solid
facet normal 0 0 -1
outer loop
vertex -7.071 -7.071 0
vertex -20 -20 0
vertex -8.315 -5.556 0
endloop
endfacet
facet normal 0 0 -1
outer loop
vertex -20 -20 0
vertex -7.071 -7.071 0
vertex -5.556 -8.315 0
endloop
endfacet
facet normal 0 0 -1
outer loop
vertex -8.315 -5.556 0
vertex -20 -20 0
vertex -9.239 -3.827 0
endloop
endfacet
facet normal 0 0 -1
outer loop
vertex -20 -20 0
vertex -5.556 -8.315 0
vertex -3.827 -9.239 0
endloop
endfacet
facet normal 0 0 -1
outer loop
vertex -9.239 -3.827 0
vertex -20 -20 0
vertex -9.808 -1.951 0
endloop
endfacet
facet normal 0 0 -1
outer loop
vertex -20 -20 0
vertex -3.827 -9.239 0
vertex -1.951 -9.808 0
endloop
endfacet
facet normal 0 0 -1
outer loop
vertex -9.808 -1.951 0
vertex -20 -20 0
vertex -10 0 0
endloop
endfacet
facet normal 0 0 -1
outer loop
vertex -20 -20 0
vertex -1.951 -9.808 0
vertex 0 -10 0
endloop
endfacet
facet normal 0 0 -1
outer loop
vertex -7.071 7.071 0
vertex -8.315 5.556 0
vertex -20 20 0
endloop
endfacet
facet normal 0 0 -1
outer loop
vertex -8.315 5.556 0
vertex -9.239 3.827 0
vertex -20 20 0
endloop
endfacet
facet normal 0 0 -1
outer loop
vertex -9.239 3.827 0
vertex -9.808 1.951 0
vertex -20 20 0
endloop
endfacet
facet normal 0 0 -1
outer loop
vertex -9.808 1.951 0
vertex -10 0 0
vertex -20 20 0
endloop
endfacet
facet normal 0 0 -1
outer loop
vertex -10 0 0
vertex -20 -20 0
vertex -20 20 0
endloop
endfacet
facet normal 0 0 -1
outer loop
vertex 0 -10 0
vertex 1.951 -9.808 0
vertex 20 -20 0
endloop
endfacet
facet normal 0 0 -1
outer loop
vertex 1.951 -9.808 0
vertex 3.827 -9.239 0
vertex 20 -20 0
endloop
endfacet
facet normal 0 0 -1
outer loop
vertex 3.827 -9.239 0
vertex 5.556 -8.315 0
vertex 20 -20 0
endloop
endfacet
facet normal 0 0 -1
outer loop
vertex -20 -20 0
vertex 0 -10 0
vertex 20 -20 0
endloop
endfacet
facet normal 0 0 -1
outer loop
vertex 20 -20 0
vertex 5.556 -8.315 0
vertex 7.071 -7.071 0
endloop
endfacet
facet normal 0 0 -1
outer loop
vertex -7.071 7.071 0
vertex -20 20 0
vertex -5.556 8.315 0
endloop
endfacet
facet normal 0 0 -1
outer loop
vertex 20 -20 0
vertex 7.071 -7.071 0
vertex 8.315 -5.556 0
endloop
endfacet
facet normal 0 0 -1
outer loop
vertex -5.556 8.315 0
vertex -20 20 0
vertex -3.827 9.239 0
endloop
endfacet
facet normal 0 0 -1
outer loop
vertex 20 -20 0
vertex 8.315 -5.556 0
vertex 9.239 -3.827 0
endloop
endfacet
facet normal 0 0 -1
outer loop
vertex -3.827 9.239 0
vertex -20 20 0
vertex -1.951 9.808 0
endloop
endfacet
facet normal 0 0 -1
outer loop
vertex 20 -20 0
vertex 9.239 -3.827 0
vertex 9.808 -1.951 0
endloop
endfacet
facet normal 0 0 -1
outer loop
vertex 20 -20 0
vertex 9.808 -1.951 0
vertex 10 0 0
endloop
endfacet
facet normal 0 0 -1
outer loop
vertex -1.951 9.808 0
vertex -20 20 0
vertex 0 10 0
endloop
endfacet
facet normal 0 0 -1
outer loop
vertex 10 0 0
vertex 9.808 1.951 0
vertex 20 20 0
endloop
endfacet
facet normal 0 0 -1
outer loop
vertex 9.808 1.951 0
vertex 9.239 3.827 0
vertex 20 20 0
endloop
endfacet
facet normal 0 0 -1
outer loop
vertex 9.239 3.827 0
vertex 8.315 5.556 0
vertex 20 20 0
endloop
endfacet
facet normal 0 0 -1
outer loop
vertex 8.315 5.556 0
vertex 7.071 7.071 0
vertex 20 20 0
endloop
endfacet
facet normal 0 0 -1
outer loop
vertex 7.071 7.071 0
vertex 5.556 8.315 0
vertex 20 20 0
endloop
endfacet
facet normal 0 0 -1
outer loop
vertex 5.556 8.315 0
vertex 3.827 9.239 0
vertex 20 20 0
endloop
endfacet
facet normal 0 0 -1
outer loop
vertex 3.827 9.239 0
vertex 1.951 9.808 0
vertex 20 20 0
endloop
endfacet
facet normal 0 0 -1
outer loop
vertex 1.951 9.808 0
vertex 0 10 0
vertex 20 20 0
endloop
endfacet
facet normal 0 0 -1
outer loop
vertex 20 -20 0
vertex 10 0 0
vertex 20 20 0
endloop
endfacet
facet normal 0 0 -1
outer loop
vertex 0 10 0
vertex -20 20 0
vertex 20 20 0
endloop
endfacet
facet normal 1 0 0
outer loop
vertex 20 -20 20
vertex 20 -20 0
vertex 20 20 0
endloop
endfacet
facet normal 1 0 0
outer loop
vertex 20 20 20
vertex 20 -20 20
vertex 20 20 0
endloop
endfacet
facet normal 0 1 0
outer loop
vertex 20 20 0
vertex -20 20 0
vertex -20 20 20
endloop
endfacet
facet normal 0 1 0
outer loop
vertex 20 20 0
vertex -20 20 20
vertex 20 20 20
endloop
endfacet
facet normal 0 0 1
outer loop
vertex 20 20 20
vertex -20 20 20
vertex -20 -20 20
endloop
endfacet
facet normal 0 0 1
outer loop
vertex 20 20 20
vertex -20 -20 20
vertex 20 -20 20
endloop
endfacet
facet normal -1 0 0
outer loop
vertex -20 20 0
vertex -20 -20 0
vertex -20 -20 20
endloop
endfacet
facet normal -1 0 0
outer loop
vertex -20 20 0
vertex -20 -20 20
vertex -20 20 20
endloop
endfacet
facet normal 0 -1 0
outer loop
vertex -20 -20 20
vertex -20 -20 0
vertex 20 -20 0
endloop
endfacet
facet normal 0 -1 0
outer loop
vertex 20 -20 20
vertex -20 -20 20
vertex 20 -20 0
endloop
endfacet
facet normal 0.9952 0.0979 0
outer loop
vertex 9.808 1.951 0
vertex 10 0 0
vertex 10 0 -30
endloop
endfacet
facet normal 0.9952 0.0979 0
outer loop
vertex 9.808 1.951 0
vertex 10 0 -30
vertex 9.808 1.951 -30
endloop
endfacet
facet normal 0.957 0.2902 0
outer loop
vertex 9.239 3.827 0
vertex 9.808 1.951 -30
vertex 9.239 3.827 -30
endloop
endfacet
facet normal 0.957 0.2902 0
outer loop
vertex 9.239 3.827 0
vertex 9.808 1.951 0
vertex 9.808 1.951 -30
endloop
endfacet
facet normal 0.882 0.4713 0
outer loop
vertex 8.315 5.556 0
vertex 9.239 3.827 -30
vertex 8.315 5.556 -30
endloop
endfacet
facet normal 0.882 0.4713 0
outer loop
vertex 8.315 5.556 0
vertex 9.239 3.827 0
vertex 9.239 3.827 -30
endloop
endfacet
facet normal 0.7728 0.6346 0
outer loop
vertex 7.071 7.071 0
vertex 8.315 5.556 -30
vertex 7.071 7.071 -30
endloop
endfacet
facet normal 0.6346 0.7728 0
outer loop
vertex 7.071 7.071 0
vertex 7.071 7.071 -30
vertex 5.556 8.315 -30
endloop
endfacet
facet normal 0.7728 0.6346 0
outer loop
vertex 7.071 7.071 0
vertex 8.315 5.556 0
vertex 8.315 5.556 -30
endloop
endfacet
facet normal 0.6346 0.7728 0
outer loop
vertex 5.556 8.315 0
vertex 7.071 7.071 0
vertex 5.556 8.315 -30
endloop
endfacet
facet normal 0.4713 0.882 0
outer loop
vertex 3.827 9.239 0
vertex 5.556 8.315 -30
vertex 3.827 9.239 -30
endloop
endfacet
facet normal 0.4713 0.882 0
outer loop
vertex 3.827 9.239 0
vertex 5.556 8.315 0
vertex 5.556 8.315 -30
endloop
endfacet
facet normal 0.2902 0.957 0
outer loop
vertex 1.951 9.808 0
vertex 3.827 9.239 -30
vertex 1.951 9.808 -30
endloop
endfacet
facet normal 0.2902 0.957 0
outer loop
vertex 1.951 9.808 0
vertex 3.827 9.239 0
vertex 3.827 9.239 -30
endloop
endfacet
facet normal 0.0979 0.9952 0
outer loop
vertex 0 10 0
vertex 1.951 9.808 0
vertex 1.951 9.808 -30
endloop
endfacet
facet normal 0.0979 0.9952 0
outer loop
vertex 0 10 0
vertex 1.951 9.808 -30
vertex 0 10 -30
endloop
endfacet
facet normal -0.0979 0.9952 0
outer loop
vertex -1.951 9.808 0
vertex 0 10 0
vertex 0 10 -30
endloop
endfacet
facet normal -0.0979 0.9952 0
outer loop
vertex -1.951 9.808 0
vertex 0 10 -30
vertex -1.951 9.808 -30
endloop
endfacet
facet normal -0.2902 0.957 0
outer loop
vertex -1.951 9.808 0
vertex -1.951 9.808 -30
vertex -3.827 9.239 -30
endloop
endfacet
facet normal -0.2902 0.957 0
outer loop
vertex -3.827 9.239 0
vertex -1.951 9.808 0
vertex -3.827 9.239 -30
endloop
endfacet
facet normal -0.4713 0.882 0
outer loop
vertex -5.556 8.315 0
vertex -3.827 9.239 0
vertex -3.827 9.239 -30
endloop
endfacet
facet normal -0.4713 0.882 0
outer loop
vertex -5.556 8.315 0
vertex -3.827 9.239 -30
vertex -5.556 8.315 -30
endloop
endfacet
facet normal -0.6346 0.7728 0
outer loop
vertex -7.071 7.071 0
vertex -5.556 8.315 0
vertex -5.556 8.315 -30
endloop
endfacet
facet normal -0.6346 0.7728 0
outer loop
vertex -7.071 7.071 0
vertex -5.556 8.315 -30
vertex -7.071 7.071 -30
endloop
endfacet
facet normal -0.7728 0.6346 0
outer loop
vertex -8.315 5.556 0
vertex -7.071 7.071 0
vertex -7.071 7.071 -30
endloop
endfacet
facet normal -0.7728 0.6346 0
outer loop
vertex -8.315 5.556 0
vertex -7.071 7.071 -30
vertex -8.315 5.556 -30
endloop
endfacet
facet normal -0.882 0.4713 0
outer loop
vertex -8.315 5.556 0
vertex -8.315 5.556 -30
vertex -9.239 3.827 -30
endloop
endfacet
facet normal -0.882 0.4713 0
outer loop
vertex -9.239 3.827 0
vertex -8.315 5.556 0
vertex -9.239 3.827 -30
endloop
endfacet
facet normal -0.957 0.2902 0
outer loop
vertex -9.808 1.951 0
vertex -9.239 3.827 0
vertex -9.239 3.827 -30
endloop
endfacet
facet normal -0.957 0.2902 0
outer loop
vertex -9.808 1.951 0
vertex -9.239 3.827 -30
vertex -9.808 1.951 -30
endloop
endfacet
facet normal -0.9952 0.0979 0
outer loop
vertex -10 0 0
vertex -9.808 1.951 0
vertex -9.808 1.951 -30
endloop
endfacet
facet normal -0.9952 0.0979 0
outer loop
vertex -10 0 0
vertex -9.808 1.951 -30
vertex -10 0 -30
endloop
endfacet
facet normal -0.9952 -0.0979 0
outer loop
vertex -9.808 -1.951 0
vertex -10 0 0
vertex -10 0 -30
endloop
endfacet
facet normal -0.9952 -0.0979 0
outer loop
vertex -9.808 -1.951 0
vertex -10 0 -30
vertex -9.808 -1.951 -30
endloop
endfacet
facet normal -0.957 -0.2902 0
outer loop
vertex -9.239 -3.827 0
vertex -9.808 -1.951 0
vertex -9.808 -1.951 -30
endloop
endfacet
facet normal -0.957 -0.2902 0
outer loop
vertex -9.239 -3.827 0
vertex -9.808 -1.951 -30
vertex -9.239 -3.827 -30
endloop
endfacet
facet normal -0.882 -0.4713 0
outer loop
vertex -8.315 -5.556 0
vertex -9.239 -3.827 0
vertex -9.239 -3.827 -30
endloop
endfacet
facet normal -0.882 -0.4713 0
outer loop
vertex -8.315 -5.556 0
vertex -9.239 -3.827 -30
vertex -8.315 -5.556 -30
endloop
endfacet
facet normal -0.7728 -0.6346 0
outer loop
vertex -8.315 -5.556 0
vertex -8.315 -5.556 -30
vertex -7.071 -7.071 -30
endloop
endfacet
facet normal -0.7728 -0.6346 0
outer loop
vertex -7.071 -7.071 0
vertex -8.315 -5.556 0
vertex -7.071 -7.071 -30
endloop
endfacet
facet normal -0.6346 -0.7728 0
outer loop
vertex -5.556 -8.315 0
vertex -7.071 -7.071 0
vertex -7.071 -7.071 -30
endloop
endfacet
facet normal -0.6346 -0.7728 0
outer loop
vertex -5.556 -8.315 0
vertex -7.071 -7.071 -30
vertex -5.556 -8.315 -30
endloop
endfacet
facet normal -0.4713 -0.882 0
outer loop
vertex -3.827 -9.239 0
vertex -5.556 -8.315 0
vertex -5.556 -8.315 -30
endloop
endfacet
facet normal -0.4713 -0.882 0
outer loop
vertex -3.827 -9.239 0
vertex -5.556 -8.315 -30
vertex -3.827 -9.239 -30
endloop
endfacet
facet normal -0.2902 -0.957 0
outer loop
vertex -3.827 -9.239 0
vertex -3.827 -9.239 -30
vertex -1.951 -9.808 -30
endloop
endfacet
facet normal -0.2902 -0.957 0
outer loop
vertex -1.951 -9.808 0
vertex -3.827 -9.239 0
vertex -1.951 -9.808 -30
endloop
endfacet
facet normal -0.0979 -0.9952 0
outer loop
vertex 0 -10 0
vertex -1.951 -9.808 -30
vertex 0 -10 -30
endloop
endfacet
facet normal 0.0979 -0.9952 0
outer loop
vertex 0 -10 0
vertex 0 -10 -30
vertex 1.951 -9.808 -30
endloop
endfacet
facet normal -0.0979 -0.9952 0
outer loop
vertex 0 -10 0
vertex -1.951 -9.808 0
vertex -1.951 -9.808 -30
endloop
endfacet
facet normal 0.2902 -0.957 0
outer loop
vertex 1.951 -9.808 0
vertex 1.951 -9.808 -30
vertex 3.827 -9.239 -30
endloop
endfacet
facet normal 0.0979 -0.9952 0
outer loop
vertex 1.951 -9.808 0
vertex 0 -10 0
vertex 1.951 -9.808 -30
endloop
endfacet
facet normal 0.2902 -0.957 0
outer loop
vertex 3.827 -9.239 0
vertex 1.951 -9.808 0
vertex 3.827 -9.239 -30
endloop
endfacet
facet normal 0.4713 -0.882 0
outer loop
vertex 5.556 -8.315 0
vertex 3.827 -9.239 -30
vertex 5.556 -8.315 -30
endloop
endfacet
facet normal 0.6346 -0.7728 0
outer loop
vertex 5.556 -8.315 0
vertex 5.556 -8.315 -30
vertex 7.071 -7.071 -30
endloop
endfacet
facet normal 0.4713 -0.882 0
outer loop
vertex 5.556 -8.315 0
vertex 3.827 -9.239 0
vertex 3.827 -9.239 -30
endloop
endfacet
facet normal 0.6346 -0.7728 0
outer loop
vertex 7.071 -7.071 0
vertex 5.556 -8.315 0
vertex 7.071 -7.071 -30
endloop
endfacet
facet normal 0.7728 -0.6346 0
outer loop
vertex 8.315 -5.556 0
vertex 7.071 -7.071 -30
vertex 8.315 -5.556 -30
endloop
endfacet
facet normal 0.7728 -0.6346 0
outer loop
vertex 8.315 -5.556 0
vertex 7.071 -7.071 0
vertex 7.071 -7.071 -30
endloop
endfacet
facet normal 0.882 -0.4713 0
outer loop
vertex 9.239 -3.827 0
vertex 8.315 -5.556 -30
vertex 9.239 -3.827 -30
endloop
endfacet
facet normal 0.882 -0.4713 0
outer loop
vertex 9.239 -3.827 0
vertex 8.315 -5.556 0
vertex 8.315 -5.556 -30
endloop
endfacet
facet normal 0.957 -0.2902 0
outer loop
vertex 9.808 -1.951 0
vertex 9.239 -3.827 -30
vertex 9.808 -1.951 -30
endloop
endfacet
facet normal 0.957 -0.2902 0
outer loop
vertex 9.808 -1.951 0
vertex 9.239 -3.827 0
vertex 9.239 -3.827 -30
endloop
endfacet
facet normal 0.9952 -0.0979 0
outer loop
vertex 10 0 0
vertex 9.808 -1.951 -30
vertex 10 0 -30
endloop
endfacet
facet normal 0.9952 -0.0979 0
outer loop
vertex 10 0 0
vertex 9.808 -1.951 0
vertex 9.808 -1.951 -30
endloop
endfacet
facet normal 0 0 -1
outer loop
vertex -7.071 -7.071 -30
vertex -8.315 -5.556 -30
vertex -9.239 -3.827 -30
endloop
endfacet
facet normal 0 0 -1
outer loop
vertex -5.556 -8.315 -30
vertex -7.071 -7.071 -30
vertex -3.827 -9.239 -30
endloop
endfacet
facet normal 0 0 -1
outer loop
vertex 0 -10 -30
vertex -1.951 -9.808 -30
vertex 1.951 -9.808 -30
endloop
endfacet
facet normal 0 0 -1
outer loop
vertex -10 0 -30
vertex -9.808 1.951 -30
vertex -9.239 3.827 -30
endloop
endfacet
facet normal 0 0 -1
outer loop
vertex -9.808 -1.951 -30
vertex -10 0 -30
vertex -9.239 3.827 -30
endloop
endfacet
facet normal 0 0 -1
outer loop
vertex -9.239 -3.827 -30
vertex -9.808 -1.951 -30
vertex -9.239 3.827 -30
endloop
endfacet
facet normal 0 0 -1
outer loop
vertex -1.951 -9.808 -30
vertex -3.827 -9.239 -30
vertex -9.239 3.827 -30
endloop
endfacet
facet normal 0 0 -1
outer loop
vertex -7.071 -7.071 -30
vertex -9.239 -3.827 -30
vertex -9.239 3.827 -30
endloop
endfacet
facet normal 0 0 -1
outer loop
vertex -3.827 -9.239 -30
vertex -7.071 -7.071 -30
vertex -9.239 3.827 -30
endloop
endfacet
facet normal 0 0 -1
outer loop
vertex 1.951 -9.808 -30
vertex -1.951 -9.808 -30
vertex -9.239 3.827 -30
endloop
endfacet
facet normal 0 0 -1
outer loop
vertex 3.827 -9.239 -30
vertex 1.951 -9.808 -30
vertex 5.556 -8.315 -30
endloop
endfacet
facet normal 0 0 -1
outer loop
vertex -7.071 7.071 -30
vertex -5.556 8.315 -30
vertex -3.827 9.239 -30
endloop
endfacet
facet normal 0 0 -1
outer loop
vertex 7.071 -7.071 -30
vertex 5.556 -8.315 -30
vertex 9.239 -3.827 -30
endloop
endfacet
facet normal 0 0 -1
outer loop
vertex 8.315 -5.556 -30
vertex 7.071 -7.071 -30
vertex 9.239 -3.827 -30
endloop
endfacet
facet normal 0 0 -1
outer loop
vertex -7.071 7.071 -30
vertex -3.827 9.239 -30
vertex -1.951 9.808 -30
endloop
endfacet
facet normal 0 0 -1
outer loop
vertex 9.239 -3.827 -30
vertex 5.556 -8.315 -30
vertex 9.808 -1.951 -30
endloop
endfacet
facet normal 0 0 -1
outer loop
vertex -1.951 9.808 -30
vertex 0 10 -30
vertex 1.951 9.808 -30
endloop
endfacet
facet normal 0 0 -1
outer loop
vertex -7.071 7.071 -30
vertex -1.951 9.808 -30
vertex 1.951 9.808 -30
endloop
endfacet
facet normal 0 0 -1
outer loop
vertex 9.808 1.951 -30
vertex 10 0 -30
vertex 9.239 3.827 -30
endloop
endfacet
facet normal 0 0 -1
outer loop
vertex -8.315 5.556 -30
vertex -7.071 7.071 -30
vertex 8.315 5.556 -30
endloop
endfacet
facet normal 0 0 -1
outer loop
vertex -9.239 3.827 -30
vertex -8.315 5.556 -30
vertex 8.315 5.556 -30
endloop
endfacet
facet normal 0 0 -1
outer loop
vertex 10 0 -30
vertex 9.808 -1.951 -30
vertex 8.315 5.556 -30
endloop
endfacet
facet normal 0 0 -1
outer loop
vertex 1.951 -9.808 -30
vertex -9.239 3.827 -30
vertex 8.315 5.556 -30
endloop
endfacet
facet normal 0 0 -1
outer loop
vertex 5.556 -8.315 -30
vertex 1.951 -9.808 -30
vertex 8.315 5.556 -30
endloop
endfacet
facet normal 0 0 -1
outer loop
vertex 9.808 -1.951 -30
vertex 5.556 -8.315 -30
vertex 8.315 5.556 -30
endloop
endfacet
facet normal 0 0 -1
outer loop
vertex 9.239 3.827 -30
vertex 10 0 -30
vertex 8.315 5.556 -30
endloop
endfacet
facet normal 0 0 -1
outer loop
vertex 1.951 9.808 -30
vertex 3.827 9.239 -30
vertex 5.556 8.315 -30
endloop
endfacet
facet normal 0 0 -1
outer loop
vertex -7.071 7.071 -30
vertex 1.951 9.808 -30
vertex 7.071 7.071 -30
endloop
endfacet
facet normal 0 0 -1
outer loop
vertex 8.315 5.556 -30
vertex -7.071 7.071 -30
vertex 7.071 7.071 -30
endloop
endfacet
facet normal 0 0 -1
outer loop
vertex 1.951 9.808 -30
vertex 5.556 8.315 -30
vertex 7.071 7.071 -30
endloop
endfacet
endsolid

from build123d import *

# Parameters (mm, degrees)
F0_W     = 40
F0_H     = 40
F1_DEPTH = 20
F2_R     = 10
F3_DEPTH = 50


with BuildPart() as f1:
    # F0 (on Top) → F1 (new body)
    with BuildSketch(Plane.XY):
        Rectangle(F0_W, F0_H)
    extrude(amount=F1_DEPTH)

    # F2 (on face) → F3 (join)
    with BuildSketch(Plane.XY.offset(20)):
        Circle(F2_R)
    extrude(amount=-F3_DEPTH)


solid = f1.part
